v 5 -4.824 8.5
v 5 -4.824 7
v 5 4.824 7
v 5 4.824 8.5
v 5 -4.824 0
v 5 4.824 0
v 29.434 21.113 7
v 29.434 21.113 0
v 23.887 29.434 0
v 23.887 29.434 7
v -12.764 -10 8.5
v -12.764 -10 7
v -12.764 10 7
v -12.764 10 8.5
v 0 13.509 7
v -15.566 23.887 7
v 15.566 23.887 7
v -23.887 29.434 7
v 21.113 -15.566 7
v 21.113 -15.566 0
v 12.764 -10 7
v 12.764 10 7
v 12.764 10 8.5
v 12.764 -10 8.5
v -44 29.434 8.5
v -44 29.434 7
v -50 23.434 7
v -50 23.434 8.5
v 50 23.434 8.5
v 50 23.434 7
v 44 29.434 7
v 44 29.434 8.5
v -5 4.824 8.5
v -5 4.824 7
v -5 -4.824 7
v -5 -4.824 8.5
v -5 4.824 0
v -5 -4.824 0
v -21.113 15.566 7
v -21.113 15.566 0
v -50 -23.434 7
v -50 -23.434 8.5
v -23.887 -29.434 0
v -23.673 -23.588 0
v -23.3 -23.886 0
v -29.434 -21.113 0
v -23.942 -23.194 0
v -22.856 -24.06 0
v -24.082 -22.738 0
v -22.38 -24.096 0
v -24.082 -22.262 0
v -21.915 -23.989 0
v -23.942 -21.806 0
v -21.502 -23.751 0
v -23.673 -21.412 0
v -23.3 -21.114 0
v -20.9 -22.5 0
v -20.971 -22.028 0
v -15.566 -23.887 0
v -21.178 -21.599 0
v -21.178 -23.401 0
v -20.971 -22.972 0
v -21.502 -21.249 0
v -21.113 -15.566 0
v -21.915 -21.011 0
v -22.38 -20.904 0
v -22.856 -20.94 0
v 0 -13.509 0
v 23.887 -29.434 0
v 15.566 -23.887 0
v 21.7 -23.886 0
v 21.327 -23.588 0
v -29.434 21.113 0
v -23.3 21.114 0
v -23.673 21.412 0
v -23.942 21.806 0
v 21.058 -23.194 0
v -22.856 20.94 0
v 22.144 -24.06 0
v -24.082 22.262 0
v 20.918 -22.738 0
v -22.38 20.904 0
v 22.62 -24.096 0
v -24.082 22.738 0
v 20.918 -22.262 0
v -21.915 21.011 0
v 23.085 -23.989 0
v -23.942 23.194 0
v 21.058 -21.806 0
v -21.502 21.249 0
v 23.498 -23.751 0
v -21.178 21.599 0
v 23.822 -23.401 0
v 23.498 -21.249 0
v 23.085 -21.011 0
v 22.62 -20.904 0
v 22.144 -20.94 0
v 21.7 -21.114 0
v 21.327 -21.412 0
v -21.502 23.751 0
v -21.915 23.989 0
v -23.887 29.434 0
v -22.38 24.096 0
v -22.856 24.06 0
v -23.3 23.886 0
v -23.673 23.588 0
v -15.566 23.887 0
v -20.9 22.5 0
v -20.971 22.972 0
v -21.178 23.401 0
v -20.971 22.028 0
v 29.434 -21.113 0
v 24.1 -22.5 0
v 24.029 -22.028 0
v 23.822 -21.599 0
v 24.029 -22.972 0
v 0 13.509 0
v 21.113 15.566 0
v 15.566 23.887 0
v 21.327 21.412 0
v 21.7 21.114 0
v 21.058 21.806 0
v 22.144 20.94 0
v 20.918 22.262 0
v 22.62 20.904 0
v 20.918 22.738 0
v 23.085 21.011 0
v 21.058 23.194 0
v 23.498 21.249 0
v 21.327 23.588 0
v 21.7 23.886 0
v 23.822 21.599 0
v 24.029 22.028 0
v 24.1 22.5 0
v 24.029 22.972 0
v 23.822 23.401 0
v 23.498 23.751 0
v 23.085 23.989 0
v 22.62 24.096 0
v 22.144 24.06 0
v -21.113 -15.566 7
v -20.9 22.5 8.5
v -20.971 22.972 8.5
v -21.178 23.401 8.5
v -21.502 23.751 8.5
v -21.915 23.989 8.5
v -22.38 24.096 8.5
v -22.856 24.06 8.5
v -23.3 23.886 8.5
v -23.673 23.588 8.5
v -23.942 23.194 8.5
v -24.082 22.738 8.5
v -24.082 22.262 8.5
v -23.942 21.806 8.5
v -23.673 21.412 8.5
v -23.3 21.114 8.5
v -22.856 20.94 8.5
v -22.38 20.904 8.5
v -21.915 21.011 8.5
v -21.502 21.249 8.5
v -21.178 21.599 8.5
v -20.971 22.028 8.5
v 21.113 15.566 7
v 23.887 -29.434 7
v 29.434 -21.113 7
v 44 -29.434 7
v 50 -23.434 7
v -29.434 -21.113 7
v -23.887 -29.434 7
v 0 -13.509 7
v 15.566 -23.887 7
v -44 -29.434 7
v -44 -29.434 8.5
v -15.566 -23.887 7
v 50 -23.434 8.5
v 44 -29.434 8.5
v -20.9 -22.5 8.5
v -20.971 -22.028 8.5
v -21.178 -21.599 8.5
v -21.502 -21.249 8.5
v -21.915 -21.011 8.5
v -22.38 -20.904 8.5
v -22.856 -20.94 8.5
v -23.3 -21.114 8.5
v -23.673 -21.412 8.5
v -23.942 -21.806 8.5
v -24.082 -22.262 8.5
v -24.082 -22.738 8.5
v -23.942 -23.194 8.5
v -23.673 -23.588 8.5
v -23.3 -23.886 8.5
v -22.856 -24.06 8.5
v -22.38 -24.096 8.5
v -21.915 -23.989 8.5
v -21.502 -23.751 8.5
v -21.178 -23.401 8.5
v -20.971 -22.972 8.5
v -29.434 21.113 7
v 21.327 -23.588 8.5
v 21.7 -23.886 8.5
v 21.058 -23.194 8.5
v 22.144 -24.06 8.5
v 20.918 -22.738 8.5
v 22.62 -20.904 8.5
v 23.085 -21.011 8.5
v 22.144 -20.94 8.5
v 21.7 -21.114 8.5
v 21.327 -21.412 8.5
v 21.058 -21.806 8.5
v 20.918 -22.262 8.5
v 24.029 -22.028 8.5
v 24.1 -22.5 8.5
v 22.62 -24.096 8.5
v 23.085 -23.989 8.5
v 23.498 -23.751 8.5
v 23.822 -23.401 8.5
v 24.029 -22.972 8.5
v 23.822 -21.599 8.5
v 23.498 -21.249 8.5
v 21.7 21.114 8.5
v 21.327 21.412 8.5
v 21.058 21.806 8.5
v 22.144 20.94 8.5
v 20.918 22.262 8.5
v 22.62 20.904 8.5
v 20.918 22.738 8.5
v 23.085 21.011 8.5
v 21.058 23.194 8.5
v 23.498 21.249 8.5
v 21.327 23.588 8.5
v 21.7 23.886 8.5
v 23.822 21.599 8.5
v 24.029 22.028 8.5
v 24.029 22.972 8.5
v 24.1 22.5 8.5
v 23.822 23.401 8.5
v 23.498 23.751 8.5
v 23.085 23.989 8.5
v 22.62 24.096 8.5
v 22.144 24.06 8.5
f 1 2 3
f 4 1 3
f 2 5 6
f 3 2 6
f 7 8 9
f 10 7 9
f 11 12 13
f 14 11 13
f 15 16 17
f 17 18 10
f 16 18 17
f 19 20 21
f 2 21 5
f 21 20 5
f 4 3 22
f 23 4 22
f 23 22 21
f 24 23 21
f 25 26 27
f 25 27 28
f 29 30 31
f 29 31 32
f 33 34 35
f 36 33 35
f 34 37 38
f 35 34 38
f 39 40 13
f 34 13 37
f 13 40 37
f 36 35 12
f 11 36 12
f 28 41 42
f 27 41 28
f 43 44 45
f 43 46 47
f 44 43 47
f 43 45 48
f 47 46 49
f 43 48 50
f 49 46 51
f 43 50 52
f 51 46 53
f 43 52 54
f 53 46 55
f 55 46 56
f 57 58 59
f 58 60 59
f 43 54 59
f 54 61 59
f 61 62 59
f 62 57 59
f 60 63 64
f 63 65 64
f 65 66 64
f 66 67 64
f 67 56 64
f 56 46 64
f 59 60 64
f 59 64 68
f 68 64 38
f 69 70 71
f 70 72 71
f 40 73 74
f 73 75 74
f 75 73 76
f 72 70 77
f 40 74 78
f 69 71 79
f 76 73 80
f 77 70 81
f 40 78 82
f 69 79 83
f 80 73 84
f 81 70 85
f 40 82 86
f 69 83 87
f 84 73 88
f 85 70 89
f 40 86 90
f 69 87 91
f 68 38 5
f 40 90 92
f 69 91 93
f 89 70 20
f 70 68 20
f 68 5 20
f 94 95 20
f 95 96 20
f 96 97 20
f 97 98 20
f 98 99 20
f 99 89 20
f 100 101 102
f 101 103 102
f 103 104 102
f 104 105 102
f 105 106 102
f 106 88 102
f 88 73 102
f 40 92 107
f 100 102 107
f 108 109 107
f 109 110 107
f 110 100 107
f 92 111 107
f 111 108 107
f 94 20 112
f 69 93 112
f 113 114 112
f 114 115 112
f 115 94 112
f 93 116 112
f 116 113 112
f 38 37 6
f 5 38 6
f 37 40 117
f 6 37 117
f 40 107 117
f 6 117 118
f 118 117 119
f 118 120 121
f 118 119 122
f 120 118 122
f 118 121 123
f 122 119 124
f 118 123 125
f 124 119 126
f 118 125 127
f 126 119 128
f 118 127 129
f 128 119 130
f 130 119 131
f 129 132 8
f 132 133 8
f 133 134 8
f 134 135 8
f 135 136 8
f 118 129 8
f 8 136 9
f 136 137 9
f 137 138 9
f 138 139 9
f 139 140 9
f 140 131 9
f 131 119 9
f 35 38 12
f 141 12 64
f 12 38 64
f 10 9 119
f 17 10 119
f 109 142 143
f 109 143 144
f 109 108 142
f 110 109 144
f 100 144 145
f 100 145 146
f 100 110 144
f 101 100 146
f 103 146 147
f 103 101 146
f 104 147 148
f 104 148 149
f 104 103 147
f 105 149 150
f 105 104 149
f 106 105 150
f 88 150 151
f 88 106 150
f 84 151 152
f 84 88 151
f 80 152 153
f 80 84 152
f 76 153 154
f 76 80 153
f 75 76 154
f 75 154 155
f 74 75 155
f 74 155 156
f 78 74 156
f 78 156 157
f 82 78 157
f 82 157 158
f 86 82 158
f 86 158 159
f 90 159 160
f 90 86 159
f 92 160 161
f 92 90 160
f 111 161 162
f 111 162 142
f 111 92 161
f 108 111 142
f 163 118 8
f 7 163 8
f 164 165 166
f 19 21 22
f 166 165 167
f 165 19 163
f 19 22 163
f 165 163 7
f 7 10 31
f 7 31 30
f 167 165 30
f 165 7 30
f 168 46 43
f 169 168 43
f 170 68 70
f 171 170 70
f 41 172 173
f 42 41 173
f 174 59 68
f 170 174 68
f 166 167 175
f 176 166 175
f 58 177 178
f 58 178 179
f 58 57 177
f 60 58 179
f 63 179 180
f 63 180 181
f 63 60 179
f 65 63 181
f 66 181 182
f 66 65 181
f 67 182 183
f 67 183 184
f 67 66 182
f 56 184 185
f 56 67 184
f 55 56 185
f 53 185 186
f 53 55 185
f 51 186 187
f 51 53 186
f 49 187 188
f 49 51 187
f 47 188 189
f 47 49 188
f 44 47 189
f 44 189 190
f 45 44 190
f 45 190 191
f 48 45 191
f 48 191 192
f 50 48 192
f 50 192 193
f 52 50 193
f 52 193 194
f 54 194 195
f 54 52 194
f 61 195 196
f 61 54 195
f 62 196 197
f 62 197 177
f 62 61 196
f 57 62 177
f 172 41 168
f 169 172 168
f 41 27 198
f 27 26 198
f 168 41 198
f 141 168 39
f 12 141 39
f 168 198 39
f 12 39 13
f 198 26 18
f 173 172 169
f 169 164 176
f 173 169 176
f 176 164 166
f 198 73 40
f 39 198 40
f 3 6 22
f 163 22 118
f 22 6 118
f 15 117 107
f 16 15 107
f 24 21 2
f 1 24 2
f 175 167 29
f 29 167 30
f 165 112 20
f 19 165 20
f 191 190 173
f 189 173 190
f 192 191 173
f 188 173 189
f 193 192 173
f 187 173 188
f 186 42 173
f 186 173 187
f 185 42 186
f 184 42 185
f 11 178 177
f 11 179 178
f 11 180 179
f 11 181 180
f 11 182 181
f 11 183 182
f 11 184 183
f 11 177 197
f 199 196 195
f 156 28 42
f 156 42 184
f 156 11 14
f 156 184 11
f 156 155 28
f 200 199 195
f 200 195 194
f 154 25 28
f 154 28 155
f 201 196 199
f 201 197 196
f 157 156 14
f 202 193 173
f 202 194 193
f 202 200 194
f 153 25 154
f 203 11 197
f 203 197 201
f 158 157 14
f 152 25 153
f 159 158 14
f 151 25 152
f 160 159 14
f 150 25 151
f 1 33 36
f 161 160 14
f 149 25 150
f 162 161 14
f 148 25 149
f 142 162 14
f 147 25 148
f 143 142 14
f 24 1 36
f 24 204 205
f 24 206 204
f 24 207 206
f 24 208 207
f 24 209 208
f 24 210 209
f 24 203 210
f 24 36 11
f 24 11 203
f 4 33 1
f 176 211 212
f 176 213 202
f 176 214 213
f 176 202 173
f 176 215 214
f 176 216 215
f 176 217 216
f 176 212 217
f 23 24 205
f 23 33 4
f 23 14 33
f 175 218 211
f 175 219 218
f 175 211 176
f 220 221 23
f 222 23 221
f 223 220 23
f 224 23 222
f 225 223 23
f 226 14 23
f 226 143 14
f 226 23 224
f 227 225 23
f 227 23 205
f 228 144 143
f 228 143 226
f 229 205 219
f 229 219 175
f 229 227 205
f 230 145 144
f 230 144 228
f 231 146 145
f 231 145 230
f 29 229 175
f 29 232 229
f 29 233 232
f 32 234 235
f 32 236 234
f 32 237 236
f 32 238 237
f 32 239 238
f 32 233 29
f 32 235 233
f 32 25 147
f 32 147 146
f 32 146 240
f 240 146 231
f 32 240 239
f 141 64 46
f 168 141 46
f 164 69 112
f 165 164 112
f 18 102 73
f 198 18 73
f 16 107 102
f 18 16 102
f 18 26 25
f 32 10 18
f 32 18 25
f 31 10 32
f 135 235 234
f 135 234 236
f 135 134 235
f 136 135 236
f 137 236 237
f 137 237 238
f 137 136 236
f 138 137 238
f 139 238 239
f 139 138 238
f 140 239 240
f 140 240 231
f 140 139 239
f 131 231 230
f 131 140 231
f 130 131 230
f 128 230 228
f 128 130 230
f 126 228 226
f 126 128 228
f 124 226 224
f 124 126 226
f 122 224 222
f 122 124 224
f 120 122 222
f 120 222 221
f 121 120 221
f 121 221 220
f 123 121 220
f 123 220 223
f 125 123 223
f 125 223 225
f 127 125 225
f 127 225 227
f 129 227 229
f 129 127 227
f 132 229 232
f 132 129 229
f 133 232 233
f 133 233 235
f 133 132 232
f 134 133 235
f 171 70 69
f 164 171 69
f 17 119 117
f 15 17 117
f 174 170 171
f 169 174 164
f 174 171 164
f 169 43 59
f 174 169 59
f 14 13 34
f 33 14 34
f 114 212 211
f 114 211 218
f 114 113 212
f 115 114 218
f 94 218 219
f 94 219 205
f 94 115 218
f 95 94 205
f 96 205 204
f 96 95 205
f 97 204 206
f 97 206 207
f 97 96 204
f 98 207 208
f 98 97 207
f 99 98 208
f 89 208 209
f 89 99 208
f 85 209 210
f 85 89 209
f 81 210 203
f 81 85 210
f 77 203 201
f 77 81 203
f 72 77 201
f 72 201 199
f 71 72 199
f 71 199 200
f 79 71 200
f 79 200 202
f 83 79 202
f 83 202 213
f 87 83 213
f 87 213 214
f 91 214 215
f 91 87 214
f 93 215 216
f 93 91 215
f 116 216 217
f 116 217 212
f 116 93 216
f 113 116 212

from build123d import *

# Parameters (mm, degrees)
SKETCH1_R           = 1.6
BOSS_EXTRUDE1_DEPTH = 7
SKETCH2_W           = 100
SKETCH2_H           = 58.867504906
SKETCH2_R           = 1.6
BOSS_EXTRUDE2_DEPTH = 1.5
CHAMFER1_SIZE       = 6
CHAMFER2_SIZE       = 6


with BuildPart() as part:
    # Sketch1 → Boss-Extrude1 (new body)
    with BuildSketch(Plane.XY):
        Polygon((-21.113249509, 15.566247547), (-5, 4.824081208), (-5, -4.824081208), (-21.113249509, -15.566247547), (-25.273500981, -18.339748528), (-29.433752453, -21.113249509), (-23.886750491, -29.433752453), (-19.726499019, -26.660251472), (-15.566247547, -23.886750491), (0, -13.509252126), (15.566247547, -23.886750491), (19.726499019, -26.660251472), (23.886750491, -29.433752453), (29.433752453, -21.113249509), (25.273500981, -18.339748528), (21.113249509, -15.566247547), (5, -4.824081208), (5, 4.824081208), (21.113249509, 15.566247547), (25.273500981, 18.339748528), (29.433752453, 21.113249509), (23.886750491, 29.433752453), (19.726499019, 26.660251472), (15.566247547, 23.886750491), (0, 13.509252126), (-15.566247547, 23.886750491), (-19.726499019, 26.660251472), (-23.886750491, 29.433752453), (-29.433752453, 21.113249509), (-25.273500981, 18.339748528), align=None)
        with Locations((-22.5, -22.5)):
            Circle(SKETCH1_R, mode=Mode.SUBTRACT)
        with Locations((22.5, -22.5)):
            Circle(SKETCH1_R, mode=Mode.SUBTRACT)
        with Locations((-22.5, 22.5)):
            Circle(SKETCH1_R, mode=Mode.SUBTRACT)
        with Locations((22.5, 22.5)):
            Circle(SKETCH1_R, mode=Mode.SUBTRACT)
    extrude(amount=BOSS_EXTRUDE1_DEPTH)

    # Sketch2 → Boss-Extrude2 (add)
    with BuildSketch(Plane.XY.offset(7)):
        Rectangle(SKETCH2_W, SKETCH2_H)
        Polygon((-12.763878189, -10), (-12.763878189, 10), (-5, 4.824081208), (-5, -4.824081208), align=None, mode=Mode.SUBTRACT)
        Polygon((12.763878189, 10), (12.763878189, -10), (5, -4.824081208), (5, 4.824081208), align=None, mode=Mode.SUBTRACT)
        with Locations((-22.5, 22.5)):
            Circle(SKETCH2_R, mode=Mode.SUBTRACT)
        with Locations((22.5, 22.5)):
            Circle(SKETCH2_R, mode=Mode.SUBTRACT)
        with Locations((22.5, -22.5)):
            Circle(SKETCH2_R, mode=Mode.SUBTRACT)
        with Locations((-22.5, -22.5)):
            Circle(SKETCH2_R, mode=Mode.SUBTRACT)
    extrude(amount=BOSS_EXTRUDE2_DEPTH)

    # Chamfer1
    chamfer1_edges = [part.edges().sort_by_distance(p)[0] for p in [
        (-50, -29.433752453, 7.75),
    ]]
    chamfer(chamfer1_edges, length=CHAMFER1_SIZE)

    # Chamfer2
    chamfer2_edges = [part.edges().sort_by_distance(p)[0] for p in [
        (50, 29.433752453, 7.75),
        (-50, 29.433752453, 7.75),
        (50, -29.433752453, 7.75),
    ]]
    chamfer(chamfer2_edges, length=CHAMFER2_SIZE)


solid = part.part
